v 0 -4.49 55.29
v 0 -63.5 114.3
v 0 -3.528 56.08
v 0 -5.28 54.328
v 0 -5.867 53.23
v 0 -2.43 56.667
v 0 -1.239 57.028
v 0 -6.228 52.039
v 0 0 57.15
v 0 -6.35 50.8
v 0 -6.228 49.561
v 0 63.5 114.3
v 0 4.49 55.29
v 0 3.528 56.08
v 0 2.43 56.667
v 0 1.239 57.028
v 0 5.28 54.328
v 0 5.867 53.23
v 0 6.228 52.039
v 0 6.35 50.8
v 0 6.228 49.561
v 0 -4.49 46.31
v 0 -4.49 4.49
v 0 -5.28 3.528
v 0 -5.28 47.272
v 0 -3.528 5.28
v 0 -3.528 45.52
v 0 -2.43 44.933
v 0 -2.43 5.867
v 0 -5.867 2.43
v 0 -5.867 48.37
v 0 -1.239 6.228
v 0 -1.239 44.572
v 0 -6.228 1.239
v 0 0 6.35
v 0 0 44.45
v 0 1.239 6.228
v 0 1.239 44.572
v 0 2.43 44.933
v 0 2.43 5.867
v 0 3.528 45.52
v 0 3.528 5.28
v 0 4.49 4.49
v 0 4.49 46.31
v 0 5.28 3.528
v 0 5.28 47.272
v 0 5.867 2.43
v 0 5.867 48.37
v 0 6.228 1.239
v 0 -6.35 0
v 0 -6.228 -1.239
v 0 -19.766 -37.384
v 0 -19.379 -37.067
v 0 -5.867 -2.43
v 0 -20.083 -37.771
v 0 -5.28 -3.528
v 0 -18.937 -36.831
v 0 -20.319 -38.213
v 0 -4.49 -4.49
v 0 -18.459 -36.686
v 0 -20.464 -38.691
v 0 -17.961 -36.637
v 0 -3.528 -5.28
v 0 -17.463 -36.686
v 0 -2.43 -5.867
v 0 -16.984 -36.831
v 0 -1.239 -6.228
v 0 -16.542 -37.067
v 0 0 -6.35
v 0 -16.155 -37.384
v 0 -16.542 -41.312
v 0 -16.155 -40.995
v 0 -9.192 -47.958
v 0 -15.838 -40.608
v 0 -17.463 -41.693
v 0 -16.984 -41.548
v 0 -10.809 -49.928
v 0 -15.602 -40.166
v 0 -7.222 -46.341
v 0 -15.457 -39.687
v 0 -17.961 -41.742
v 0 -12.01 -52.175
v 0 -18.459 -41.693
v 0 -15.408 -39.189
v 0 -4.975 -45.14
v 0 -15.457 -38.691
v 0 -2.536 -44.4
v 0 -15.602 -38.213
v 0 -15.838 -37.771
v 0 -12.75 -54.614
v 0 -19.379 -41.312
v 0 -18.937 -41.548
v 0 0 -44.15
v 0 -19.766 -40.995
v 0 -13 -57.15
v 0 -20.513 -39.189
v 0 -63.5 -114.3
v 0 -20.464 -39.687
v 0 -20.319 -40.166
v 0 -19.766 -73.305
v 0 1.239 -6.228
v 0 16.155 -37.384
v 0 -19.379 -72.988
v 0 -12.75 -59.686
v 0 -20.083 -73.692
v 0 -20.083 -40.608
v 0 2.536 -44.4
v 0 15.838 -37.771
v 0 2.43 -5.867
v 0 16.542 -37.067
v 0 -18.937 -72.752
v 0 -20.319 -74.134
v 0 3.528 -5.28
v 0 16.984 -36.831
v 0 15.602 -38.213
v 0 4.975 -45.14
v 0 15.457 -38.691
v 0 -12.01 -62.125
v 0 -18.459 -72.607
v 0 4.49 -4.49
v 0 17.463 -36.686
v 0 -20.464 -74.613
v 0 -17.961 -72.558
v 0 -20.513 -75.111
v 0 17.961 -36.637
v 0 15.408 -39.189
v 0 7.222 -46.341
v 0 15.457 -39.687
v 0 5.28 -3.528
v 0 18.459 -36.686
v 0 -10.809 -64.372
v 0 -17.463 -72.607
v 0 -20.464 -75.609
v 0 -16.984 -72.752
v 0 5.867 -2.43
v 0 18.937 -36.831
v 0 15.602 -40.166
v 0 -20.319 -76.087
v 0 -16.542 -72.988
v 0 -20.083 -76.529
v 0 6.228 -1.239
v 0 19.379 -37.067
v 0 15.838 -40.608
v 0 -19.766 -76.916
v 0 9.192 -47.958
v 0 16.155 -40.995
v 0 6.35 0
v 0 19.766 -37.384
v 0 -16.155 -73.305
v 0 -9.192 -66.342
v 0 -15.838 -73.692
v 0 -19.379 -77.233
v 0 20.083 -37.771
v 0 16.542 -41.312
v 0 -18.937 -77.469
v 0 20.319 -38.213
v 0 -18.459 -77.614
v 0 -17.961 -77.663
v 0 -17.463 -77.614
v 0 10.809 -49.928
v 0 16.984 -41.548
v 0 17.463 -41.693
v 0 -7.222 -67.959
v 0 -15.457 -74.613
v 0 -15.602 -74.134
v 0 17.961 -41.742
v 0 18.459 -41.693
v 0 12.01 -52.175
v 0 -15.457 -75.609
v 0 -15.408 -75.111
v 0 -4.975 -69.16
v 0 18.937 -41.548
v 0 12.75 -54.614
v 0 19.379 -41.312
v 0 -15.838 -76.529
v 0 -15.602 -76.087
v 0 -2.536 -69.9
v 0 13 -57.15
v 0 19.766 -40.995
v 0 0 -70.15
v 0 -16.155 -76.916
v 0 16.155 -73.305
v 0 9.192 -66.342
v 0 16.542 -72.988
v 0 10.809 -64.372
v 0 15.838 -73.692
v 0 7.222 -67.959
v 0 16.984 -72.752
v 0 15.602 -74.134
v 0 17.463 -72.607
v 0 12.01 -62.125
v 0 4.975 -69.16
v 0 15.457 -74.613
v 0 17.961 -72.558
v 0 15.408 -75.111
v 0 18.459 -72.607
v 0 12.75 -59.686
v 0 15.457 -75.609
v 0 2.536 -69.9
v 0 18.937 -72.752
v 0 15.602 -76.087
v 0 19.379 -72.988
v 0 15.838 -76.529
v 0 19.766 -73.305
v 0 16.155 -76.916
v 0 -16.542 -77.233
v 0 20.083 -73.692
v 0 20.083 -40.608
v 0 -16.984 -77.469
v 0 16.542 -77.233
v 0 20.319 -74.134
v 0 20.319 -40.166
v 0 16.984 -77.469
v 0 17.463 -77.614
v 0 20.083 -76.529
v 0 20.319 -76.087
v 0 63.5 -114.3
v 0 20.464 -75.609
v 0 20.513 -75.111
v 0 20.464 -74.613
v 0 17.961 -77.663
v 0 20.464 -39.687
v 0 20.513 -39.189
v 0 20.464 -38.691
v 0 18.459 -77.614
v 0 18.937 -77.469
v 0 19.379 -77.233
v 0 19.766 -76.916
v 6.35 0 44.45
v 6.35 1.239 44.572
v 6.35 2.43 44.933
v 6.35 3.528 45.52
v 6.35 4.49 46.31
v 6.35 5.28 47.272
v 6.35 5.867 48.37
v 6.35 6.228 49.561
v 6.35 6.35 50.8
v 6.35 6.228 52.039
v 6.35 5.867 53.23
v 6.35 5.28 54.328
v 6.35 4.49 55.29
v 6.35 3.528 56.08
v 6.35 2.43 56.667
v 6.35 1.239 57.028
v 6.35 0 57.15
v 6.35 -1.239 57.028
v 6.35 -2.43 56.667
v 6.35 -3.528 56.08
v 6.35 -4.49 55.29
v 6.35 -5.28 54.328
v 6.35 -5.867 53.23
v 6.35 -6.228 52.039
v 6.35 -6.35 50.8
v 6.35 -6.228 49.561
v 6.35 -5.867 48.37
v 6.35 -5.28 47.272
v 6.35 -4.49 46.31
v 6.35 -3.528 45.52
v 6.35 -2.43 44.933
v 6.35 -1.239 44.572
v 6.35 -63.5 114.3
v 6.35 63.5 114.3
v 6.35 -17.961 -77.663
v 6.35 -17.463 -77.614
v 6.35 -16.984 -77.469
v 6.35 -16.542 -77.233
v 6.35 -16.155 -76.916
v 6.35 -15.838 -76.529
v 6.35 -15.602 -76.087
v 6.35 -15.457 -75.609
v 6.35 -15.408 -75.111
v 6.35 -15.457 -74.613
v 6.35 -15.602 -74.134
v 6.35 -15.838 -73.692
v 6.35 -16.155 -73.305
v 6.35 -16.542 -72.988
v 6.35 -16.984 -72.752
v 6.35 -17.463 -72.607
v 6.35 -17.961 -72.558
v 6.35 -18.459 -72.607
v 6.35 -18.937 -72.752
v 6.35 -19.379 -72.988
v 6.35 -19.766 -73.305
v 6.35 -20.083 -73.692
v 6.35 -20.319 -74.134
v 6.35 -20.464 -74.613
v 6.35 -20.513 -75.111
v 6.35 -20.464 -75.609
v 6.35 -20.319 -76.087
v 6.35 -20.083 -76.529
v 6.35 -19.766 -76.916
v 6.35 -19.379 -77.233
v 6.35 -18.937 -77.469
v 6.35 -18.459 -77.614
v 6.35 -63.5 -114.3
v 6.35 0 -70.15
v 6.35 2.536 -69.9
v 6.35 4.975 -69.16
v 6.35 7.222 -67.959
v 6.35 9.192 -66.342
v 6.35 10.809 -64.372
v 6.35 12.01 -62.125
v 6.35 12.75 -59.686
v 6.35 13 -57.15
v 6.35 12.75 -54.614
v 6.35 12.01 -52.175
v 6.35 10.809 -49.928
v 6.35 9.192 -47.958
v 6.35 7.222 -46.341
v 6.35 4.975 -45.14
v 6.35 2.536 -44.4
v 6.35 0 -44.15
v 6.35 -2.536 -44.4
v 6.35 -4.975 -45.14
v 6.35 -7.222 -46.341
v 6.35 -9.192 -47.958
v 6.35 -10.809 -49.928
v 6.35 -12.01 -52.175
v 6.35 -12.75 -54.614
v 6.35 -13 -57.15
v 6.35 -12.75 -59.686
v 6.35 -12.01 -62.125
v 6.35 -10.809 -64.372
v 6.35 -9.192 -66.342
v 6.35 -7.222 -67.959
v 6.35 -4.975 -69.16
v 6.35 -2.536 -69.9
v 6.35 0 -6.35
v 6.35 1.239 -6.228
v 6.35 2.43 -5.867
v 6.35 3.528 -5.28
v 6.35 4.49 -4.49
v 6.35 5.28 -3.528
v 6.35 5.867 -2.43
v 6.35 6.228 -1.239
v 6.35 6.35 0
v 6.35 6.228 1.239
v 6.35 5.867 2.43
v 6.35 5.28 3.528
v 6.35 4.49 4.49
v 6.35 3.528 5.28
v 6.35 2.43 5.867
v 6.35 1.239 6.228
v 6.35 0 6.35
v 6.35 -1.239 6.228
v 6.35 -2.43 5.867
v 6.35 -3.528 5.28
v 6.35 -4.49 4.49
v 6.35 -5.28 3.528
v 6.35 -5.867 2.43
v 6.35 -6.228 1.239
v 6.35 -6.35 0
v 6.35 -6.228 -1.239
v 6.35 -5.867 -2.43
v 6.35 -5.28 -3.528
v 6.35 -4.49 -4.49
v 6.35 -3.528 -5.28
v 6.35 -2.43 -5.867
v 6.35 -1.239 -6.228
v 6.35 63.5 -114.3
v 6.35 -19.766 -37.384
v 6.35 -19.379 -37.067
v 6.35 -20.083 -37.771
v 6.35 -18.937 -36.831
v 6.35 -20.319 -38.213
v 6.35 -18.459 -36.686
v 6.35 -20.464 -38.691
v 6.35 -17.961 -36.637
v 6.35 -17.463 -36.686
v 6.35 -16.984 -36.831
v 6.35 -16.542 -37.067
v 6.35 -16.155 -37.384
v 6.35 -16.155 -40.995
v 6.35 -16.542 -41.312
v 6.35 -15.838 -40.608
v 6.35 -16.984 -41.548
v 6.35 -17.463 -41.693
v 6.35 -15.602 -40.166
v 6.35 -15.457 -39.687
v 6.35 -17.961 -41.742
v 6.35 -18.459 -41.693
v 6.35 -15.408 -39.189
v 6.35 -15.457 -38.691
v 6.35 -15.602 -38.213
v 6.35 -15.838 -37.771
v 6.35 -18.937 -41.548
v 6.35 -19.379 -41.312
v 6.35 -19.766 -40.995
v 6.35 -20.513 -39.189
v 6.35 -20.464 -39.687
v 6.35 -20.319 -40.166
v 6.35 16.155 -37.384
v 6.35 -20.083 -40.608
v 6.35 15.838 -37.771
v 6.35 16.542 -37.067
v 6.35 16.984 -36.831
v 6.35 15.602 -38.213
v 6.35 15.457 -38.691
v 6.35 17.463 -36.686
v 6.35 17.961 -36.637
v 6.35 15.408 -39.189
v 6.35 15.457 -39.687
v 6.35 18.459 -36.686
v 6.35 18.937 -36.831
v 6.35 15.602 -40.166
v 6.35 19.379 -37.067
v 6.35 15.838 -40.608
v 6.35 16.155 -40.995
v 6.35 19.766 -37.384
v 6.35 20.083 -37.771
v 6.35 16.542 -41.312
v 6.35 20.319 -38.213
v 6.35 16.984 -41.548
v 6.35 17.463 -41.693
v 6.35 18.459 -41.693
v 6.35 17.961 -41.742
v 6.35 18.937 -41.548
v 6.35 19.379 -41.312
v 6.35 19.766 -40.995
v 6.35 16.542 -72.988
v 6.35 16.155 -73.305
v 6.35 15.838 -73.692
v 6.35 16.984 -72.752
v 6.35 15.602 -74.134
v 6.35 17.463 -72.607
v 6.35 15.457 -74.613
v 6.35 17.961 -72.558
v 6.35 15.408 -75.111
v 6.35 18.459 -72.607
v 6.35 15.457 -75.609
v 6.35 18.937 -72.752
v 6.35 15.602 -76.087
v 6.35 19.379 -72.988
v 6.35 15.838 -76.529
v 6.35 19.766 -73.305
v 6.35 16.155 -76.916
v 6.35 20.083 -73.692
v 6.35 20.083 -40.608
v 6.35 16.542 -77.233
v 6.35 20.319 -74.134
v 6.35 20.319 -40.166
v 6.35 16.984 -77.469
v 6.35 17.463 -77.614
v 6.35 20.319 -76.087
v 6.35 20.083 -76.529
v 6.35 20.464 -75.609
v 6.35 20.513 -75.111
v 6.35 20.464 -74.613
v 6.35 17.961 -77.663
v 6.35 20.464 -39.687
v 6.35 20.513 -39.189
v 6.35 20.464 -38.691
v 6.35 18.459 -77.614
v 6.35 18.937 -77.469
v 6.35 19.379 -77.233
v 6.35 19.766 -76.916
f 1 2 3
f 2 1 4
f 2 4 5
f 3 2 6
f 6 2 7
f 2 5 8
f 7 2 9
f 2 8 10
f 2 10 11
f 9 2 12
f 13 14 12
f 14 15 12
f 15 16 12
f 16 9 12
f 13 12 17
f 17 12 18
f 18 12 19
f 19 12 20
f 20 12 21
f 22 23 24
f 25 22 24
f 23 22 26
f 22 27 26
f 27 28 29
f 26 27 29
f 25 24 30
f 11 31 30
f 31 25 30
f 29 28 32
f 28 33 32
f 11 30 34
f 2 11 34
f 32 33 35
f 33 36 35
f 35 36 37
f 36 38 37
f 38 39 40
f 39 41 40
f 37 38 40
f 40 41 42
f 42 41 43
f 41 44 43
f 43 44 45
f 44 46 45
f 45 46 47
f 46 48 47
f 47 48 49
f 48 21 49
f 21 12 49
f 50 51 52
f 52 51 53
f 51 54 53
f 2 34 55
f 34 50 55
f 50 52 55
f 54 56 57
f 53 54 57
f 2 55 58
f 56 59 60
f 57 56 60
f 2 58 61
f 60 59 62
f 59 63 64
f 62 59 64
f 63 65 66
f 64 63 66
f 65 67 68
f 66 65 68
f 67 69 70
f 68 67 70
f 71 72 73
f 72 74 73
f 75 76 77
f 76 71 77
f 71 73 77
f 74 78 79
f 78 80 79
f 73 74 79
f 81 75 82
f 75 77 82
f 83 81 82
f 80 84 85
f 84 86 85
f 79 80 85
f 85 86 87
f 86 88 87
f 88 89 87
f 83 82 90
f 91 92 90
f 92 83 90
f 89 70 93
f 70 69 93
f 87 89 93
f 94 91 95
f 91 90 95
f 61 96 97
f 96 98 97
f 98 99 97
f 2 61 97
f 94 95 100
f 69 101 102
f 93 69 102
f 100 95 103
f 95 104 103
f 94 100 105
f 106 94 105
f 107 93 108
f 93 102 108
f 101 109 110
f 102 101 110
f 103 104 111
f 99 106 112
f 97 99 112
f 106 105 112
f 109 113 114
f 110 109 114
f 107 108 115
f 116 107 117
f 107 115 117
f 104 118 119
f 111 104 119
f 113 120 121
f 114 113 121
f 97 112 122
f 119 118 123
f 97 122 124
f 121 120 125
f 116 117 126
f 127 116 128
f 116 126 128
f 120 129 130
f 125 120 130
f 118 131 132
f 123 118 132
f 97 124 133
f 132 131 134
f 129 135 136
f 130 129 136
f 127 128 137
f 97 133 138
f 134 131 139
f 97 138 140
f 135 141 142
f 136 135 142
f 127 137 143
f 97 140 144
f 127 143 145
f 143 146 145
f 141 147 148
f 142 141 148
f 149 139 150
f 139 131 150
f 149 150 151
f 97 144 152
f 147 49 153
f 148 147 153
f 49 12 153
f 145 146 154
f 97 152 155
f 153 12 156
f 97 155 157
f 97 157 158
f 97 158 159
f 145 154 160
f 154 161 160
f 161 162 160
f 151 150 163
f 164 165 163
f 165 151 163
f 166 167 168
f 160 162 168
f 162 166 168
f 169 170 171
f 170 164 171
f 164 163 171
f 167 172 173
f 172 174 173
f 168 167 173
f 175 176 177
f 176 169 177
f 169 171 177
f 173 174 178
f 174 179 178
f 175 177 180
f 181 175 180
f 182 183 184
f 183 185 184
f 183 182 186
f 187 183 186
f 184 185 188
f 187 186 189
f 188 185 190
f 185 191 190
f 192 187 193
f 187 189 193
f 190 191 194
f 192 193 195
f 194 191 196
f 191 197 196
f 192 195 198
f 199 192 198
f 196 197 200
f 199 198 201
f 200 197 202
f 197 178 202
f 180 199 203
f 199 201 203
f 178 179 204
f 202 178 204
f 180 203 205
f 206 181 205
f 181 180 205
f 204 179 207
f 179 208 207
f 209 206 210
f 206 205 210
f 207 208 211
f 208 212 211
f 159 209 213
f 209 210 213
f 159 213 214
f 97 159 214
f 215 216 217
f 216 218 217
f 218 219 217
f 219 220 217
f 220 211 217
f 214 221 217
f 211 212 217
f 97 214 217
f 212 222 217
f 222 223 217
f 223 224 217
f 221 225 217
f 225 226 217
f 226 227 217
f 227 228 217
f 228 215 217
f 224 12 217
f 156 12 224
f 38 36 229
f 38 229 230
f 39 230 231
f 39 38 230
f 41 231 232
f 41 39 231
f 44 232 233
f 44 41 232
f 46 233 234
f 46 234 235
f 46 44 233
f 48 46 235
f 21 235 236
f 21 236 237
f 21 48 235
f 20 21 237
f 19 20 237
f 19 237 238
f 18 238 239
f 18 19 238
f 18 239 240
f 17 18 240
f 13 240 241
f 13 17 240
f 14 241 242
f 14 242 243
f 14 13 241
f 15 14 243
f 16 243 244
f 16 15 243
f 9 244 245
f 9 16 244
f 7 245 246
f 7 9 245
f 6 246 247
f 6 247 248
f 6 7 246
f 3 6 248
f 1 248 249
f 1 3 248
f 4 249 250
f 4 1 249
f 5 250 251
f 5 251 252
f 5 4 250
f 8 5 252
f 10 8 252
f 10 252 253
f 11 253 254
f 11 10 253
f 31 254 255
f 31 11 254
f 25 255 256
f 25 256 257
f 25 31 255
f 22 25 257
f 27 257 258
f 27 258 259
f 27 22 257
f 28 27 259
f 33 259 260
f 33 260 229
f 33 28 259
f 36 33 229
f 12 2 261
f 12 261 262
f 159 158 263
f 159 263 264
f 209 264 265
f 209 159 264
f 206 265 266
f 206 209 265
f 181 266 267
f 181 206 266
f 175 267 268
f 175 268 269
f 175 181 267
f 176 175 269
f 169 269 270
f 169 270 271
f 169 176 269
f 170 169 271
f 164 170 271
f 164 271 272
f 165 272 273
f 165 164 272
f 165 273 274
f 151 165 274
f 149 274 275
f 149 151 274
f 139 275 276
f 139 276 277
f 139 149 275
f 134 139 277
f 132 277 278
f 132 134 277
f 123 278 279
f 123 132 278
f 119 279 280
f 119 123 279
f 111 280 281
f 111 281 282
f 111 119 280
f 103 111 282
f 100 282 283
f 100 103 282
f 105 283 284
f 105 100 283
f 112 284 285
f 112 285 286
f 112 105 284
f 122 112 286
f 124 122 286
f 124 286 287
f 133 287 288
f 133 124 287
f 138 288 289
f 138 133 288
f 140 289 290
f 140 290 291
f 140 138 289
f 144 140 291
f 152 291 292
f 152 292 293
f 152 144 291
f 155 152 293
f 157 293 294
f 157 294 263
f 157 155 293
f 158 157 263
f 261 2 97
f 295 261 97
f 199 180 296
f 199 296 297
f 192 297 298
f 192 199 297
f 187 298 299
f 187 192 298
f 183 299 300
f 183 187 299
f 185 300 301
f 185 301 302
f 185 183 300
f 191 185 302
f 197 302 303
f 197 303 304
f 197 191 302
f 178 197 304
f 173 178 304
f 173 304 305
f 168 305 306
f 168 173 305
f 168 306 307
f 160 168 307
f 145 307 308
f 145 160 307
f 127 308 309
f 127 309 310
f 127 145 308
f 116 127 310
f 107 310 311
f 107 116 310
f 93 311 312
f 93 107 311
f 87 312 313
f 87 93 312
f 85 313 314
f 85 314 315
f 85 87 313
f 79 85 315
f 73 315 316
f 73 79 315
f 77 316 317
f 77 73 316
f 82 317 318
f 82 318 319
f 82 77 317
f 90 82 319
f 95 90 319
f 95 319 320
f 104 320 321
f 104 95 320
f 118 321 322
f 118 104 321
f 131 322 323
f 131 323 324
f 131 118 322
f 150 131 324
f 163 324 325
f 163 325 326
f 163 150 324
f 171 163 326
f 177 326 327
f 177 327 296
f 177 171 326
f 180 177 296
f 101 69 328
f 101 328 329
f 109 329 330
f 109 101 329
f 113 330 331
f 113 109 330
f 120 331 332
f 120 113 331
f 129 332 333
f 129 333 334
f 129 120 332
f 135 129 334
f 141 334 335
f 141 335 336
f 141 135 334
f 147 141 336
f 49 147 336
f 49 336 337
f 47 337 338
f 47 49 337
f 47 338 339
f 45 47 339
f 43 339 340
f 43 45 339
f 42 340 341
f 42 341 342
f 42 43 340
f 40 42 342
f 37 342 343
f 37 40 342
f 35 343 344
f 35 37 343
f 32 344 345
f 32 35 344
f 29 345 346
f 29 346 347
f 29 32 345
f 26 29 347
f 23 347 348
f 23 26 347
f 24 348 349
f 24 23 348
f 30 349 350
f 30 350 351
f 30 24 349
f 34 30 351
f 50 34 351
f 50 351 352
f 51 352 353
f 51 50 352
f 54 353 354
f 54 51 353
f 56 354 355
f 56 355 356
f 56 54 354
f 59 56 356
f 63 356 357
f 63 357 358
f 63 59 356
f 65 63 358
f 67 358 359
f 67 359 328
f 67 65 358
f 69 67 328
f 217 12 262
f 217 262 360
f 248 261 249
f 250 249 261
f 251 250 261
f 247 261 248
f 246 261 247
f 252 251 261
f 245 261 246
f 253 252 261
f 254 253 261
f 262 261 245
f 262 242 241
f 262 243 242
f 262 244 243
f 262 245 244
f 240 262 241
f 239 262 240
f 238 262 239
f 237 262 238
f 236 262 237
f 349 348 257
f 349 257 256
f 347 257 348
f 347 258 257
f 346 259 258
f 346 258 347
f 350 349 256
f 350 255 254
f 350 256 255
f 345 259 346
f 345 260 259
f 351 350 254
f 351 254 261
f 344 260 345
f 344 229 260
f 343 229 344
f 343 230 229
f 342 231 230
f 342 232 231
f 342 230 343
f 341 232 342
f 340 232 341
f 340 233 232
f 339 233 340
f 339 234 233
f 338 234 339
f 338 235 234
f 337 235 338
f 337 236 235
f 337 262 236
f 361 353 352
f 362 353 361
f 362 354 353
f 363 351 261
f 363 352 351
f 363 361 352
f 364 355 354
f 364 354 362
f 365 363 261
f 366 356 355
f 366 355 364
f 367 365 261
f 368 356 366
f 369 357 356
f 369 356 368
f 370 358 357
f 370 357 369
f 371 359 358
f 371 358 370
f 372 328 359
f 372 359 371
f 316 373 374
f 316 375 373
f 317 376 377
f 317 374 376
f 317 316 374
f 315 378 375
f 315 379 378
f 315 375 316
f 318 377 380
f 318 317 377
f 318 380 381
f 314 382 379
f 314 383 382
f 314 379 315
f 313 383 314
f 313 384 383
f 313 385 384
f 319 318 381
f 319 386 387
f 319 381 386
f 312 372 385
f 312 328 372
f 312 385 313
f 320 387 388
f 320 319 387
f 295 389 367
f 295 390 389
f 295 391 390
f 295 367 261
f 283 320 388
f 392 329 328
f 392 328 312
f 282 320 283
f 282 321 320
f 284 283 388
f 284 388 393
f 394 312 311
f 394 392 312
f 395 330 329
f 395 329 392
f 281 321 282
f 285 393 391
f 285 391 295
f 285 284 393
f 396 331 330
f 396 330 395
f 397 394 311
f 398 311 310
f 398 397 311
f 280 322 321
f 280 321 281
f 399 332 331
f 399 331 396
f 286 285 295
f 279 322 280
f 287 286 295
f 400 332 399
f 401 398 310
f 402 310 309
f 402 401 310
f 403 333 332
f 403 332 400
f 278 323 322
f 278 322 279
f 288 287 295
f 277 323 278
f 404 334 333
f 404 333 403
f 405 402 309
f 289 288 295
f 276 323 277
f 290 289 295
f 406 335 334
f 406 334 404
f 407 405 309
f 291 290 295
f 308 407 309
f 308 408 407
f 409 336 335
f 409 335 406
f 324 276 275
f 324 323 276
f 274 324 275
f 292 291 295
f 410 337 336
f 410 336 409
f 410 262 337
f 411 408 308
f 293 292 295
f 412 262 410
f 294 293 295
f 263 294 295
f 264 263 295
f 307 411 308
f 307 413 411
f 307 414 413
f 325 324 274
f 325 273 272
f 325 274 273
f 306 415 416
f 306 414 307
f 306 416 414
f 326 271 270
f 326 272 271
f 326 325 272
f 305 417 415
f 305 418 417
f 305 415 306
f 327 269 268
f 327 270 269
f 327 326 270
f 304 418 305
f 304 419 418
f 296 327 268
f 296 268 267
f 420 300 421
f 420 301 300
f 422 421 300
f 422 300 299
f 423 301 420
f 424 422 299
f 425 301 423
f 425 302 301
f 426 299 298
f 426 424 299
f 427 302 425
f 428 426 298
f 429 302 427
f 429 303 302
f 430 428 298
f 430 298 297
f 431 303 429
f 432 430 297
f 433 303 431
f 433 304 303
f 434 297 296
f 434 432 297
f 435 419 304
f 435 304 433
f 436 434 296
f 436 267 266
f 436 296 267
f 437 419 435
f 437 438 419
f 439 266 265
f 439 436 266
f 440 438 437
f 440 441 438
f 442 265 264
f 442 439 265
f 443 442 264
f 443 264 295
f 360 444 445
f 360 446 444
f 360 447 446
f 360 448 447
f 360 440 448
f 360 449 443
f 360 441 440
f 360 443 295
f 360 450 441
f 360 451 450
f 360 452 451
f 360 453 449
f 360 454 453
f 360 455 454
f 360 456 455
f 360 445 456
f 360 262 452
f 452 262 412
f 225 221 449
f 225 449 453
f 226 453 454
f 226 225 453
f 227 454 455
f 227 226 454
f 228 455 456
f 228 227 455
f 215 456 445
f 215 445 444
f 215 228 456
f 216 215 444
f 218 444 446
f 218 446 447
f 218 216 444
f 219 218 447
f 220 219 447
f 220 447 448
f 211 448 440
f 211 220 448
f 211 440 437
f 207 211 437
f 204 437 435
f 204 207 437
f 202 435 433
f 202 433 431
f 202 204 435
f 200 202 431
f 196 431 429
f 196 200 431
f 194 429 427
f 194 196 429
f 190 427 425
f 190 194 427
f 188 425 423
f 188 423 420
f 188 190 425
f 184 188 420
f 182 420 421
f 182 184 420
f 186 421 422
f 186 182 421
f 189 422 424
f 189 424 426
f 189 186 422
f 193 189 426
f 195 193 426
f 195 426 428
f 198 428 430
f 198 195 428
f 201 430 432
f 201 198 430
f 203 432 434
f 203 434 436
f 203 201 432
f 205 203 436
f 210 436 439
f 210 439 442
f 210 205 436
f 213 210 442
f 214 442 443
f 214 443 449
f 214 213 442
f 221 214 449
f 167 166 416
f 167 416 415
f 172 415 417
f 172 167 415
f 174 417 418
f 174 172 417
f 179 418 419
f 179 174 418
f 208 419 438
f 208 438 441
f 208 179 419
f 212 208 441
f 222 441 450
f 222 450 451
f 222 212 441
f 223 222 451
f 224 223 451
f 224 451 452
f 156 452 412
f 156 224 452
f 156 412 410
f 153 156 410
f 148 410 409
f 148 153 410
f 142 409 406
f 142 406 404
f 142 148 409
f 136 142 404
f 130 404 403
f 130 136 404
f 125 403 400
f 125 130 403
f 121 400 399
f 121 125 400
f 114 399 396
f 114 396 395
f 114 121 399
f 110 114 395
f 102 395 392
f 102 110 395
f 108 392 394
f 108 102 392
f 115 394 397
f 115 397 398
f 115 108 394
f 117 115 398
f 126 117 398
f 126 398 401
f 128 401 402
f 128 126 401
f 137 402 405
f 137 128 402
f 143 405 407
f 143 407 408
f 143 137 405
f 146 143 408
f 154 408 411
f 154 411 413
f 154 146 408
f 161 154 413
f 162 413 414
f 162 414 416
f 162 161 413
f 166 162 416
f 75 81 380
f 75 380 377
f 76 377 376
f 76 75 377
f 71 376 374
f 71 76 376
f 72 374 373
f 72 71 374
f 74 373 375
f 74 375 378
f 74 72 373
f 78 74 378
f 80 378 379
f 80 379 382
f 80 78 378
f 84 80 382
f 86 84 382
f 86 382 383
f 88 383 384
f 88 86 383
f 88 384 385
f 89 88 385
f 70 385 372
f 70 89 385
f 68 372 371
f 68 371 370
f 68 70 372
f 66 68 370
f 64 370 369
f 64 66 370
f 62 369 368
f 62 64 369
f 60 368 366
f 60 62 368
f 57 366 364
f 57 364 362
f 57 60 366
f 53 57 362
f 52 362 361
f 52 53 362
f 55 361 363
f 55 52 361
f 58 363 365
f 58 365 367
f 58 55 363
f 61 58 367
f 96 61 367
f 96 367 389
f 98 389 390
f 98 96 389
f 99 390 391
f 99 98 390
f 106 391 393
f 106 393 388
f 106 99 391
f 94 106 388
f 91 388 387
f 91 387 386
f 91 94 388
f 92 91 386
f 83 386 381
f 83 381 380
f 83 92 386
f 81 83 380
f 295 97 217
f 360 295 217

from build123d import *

# Parameters (mm, degrees)
SKETCH2_W           = 228.6
SKETCH2_H           = 127
SKETCH2_R           = 6.35
SKETCH2_R_2         = 13.000000035
SKETCH2_R_3         = 2.5527
BOSS_EXTRUDE2_DEPTH = 6.35


with BuildPart() as part:
    # Sketch2 → Boss-Extrude2 (new body)
    with BuildSketch(Plane(origin=(0, 0, 0), x_dir=(0, 0, -1), z_dir=(1, 0, 0))):
        Rectangle(SKETCH2_W, SKETCH2_H)
        with Locations((-50.8, 0)):
            Circle(SKETCH2_R, mode=Mode.SUBTRACT)
        with Locations((57.15, 0)):
            Circle(SKETCH2_R_2, mode=Mode.SUBTRACT)
        Circle(SKETCH2_R, mode=Mode.SUBTRACT)
        with Locations((75.110512242, 17.960512242)):
            Circle(SKETCH2_R_3, mode=Mode.SUBTRACT)
        with Locations((75.110512242, -17.960512242)):
            Circle(SKETCH2_R_3, mode=Mode.SUBTRACT)
        with Locations((39.189487758, -17.960512242)):
            Circle(SKETCH2_R_3, mode=Mode.SUBTRACT)
        with Locations((39.189487758, 17.960512242)):
            Circle(SKETCH2_R_3, mode=Mode.SUBTRACT)
    extrude(amount=BOSS_EXTRUDE2_DEPTH)


solid = part.part
